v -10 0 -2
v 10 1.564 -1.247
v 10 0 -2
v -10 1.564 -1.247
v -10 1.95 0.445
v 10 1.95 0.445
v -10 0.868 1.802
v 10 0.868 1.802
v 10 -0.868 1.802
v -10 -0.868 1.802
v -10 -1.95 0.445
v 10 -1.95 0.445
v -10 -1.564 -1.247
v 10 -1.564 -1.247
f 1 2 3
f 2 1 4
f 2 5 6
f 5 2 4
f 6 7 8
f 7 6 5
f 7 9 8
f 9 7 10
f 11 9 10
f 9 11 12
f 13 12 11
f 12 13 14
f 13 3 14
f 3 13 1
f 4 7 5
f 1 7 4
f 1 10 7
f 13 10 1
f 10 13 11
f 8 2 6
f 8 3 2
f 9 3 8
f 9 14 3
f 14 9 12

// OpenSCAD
//union() {
//    translate([10,0,0]) sphere(r=5);
//    color("red") rotate([0,90,0]) cylinder(r=2,h=20,center=true);
//}

union() {
    %translate([-10,0,0]) sphere(r=5);
    rotate([0,90,0]) cylinder(r=2,h=20,center=true);
    %translate([10,0,0]) sphere(r=5);
} 
